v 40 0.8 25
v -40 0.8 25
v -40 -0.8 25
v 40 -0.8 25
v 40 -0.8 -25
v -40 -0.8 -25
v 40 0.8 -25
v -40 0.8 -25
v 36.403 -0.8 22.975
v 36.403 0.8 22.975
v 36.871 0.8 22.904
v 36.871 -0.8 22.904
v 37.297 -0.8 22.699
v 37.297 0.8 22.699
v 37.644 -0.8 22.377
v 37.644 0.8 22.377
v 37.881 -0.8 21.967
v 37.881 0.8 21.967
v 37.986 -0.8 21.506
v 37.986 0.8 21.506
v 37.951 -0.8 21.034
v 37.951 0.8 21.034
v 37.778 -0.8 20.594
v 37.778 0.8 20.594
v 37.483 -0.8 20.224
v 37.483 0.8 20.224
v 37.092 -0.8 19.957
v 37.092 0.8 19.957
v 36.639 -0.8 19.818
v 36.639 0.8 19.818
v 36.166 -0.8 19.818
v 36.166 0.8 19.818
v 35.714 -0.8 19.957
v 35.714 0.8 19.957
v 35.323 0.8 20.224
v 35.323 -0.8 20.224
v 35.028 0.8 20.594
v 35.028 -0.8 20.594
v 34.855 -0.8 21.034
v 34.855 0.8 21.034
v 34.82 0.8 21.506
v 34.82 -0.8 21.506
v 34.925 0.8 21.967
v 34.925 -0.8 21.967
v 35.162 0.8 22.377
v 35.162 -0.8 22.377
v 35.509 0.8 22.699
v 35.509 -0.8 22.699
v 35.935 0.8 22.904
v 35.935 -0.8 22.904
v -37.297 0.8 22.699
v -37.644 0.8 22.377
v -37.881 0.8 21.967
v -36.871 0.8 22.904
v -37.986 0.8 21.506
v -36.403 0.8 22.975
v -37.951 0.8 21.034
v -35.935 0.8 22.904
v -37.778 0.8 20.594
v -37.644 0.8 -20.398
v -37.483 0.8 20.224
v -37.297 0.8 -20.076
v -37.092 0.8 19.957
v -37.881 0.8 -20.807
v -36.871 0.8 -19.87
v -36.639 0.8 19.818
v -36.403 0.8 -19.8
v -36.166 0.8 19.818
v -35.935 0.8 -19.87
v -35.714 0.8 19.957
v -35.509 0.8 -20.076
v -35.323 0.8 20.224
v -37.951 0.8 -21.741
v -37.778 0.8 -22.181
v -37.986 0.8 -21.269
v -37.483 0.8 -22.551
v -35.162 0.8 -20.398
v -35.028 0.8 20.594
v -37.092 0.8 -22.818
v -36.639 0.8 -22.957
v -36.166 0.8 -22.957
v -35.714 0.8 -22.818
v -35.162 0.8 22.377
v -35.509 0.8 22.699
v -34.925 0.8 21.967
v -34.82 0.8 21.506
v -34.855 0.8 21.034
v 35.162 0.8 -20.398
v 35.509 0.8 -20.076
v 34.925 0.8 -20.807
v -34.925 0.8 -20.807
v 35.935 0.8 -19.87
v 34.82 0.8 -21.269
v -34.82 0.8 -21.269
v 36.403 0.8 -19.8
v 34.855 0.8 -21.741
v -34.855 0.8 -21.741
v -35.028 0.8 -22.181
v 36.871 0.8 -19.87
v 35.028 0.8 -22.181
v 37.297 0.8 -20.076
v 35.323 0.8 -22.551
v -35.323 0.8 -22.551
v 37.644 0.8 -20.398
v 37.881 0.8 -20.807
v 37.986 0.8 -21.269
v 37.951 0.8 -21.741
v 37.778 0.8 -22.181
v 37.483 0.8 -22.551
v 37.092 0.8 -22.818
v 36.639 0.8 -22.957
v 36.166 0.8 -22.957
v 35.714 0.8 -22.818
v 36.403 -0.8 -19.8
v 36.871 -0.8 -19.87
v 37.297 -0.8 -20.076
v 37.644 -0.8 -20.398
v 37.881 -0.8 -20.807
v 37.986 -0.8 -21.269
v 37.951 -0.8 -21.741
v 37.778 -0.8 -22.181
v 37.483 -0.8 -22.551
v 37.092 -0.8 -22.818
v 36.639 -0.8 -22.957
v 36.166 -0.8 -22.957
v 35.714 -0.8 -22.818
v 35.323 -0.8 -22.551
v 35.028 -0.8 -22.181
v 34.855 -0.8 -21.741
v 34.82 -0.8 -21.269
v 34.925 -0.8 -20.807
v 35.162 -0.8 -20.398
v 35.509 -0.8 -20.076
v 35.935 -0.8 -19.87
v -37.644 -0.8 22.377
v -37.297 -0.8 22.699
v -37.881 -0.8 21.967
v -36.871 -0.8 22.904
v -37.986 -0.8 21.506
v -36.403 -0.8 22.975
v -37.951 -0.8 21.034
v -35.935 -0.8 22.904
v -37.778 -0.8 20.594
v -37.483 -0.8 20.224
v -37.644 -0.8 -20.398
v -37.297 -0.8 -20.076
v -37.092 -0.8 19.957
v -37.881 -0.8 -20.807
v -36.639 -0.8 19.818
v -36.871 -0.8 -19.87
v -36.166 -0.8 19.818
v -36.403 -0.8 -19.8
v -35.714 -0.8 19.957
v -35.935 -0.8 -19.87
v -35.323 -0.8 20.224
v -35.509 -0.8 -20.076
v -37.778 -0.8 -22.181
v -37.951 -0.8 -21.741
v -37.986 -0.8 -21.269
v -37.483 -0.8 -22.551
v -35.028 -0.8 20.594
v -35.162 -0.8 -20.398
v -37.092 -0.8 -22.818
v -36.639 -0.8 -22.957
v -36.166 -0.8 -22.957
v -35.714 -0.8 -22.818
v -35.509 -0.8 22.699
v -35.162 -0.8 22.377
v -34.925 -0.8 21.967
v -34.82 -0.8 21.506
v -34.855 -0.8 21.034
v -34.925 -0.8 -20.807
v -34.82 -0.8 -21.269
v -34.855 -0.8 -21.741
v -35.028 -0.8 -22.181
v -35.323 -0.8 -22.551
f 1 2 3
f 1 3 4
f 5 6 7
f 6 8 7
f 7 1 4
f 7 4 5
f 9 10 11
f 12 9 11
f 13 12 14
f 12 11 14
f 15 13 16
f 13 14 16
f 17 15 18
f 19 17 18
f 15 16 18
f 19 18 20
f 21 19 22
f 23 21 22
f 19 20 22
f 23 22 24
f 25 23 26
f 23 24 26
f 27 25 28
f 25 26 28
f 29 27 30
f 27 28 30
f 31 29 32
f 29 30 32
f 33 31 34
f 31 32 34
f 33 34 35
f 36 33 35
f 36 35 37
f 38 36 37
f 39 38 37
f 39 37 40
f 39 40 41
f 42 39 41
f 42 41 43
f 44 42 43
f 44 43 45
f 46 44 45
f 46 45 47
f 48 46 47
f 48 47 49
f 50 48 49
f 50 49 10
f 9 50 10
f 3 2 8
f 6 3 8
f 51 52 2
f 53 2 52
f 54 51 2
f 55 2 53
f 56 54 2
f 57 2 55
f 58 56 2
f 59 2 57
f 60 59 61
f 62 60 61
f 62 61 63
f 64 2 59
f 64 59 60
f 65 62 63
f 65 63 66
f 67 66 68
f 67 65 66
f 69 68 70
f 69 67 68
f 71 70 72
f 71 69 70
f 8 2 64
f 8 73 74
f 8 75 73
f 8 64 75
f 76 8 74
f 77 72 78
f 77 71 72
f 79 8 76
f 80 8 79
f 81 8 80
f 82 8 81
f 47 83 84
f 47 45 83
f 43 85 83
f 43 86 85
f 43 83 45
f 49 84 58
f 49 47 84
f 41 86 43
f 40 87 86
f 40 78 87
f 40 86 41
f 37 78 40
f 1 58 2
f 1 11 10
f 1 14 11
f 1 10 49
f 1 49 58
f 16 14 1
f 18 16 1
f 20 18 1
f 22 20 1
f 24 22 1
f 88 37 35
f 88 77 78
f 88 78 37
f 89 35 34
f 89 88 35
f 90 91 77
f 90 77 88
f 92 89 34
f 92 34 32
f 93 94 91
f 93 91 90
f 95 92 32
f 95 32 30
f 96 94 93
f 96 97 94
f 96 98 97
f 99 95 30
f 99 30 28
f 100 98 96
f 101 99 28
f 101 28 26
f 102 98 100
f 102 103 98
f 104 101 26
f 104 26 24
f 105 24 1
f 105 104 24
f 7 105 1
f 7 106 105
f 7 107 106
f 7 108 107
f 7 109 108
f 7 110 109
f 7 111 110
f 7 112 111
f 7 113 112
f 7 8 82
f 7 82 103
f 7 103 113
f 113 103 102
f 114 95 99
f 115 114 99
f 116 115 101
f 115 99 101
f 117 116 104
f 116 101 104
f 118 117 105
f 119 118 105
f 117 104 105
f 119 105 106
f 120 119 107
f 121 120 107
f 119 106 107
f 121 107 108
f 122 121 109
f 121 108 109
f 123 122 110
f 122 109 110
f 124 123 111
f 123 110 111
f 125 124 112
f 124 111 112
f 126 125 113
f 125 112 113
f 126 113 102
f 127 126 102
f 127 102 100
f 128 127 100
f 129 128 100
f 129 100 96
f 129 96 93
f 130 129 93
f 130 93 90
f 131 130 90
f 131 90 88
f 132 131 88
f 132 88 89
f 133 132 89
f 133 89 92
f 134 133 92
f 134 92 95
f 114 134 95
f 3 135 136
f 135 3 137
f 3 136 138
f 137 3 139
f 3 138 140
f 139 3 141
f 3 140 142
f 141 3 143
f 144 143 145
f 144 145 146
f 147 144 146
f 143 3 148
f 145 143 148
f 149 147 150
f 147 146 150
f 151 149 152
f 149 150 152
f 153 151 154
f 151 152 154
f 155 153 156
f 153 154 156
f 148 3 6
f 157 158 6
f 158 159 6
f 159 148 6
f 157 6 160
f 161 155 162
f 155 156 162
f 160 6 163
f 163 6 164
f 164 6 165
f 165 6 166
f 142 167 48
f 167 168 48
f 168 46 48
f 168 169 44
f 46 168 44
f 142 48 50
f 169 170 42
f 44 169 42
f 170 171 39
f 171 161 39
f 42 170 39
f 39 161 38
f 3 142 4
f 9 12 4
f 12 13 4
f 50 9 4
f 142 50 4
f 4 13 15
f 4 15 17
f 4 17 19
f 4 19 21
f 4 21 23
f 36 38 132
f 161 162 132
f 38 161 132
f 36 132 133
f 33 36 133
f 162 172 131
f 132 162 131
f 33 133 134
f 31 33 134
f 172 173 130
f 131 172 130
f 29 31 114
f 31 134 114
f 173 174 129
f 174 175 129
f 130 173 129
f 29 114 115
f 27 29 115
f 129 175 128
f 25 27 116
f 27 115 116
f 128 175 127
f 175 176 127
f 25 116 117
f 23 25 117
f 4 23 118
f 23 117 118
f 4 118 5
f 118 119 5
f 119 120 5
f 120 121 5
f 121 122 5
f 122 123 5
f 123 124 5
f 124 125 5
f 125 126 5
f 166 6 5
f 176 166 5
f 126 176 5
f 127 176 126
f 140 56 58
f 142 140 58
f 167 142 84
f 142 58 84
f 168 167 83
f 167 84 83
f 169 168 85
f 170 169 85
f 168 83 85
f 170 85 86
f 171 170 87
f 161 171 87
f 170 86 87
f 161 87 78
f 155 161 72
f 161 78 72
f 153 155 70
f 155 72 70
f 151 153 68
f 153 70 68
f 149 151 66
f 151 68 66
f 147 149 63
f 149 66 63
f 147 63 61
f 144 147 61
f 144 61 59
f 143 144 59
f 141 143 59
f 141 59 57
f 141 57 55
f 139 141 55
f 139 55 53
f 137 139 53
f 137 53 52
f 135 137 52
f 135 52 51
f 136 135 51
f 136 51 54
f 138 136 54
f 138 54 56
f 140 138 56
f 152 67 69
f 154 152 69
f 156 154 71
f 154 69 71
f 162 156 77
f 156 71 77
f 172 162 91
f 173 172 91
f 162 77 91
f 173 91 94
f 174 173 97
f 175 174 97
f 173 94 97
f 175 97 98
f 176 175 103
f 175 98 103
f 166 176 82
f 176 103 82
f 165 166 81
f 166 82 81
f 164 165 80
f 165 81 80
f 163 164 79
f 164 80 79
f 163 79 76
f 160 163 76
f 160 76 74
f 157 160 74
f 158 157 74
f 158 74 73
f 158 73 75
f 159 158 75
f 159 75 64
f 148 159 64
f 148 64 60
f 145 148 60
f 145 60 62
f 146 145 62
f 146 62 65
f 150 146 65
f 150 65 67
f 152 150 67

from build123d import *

# Parameters (mm, degrees)
SKETCH1_W           = 80
SKETCH1_H           = 50
BOSS_EXTRUDE1_DEPTH = 0.8001
SKETCH2_R           = 1.5875
CUT_EXTRUDE1_DEPTH  = 48.197040586


with BuildPart() as part:
    # Sketch1 → Boss-Extrude1 (new, symmetric)
    with BuildSketch(Plane(origin=(0, 0, 0), x_dir=(1, 0, 0), z_dir=(0, 1, 0))):
        Rectangle(SKETCH1_W, SKETCH1_H)
    extrude(amount=BOSS_EXTRUDE1_DEPTH, both=True)

    # Sketch2 → Cut-Extrude1 (cut, through all)
    with BuildSketch(Plane(origin=(0, 0.8001, 0), x_dir=(1, 0, 0), z_dir=(0, 1, 0))):
        with Locations(Location((-36.40283621, 21.38740377, 0), (0, 0, 270))):
            Circle(SKETCH2_R)
        with Locations(Location((-36.40283621, -21.38740377, 0), (0, 0, 270))):
            Circle(SKETCH2_R)
        with Locations(Location((36.40283621, -21.38740377, 0), (0, 0, 270))):
            Circle(SKETCH2_R)
        with Locations(Location((36.40283621, 21.38740377, 0), (0, 0, 270))):
            Circle(SKETCH2_R)
    extrude(amount=-CUT_EXTRUDE1_DEPTH, mode=Mode.SUBTRACT)


solid = part.part
